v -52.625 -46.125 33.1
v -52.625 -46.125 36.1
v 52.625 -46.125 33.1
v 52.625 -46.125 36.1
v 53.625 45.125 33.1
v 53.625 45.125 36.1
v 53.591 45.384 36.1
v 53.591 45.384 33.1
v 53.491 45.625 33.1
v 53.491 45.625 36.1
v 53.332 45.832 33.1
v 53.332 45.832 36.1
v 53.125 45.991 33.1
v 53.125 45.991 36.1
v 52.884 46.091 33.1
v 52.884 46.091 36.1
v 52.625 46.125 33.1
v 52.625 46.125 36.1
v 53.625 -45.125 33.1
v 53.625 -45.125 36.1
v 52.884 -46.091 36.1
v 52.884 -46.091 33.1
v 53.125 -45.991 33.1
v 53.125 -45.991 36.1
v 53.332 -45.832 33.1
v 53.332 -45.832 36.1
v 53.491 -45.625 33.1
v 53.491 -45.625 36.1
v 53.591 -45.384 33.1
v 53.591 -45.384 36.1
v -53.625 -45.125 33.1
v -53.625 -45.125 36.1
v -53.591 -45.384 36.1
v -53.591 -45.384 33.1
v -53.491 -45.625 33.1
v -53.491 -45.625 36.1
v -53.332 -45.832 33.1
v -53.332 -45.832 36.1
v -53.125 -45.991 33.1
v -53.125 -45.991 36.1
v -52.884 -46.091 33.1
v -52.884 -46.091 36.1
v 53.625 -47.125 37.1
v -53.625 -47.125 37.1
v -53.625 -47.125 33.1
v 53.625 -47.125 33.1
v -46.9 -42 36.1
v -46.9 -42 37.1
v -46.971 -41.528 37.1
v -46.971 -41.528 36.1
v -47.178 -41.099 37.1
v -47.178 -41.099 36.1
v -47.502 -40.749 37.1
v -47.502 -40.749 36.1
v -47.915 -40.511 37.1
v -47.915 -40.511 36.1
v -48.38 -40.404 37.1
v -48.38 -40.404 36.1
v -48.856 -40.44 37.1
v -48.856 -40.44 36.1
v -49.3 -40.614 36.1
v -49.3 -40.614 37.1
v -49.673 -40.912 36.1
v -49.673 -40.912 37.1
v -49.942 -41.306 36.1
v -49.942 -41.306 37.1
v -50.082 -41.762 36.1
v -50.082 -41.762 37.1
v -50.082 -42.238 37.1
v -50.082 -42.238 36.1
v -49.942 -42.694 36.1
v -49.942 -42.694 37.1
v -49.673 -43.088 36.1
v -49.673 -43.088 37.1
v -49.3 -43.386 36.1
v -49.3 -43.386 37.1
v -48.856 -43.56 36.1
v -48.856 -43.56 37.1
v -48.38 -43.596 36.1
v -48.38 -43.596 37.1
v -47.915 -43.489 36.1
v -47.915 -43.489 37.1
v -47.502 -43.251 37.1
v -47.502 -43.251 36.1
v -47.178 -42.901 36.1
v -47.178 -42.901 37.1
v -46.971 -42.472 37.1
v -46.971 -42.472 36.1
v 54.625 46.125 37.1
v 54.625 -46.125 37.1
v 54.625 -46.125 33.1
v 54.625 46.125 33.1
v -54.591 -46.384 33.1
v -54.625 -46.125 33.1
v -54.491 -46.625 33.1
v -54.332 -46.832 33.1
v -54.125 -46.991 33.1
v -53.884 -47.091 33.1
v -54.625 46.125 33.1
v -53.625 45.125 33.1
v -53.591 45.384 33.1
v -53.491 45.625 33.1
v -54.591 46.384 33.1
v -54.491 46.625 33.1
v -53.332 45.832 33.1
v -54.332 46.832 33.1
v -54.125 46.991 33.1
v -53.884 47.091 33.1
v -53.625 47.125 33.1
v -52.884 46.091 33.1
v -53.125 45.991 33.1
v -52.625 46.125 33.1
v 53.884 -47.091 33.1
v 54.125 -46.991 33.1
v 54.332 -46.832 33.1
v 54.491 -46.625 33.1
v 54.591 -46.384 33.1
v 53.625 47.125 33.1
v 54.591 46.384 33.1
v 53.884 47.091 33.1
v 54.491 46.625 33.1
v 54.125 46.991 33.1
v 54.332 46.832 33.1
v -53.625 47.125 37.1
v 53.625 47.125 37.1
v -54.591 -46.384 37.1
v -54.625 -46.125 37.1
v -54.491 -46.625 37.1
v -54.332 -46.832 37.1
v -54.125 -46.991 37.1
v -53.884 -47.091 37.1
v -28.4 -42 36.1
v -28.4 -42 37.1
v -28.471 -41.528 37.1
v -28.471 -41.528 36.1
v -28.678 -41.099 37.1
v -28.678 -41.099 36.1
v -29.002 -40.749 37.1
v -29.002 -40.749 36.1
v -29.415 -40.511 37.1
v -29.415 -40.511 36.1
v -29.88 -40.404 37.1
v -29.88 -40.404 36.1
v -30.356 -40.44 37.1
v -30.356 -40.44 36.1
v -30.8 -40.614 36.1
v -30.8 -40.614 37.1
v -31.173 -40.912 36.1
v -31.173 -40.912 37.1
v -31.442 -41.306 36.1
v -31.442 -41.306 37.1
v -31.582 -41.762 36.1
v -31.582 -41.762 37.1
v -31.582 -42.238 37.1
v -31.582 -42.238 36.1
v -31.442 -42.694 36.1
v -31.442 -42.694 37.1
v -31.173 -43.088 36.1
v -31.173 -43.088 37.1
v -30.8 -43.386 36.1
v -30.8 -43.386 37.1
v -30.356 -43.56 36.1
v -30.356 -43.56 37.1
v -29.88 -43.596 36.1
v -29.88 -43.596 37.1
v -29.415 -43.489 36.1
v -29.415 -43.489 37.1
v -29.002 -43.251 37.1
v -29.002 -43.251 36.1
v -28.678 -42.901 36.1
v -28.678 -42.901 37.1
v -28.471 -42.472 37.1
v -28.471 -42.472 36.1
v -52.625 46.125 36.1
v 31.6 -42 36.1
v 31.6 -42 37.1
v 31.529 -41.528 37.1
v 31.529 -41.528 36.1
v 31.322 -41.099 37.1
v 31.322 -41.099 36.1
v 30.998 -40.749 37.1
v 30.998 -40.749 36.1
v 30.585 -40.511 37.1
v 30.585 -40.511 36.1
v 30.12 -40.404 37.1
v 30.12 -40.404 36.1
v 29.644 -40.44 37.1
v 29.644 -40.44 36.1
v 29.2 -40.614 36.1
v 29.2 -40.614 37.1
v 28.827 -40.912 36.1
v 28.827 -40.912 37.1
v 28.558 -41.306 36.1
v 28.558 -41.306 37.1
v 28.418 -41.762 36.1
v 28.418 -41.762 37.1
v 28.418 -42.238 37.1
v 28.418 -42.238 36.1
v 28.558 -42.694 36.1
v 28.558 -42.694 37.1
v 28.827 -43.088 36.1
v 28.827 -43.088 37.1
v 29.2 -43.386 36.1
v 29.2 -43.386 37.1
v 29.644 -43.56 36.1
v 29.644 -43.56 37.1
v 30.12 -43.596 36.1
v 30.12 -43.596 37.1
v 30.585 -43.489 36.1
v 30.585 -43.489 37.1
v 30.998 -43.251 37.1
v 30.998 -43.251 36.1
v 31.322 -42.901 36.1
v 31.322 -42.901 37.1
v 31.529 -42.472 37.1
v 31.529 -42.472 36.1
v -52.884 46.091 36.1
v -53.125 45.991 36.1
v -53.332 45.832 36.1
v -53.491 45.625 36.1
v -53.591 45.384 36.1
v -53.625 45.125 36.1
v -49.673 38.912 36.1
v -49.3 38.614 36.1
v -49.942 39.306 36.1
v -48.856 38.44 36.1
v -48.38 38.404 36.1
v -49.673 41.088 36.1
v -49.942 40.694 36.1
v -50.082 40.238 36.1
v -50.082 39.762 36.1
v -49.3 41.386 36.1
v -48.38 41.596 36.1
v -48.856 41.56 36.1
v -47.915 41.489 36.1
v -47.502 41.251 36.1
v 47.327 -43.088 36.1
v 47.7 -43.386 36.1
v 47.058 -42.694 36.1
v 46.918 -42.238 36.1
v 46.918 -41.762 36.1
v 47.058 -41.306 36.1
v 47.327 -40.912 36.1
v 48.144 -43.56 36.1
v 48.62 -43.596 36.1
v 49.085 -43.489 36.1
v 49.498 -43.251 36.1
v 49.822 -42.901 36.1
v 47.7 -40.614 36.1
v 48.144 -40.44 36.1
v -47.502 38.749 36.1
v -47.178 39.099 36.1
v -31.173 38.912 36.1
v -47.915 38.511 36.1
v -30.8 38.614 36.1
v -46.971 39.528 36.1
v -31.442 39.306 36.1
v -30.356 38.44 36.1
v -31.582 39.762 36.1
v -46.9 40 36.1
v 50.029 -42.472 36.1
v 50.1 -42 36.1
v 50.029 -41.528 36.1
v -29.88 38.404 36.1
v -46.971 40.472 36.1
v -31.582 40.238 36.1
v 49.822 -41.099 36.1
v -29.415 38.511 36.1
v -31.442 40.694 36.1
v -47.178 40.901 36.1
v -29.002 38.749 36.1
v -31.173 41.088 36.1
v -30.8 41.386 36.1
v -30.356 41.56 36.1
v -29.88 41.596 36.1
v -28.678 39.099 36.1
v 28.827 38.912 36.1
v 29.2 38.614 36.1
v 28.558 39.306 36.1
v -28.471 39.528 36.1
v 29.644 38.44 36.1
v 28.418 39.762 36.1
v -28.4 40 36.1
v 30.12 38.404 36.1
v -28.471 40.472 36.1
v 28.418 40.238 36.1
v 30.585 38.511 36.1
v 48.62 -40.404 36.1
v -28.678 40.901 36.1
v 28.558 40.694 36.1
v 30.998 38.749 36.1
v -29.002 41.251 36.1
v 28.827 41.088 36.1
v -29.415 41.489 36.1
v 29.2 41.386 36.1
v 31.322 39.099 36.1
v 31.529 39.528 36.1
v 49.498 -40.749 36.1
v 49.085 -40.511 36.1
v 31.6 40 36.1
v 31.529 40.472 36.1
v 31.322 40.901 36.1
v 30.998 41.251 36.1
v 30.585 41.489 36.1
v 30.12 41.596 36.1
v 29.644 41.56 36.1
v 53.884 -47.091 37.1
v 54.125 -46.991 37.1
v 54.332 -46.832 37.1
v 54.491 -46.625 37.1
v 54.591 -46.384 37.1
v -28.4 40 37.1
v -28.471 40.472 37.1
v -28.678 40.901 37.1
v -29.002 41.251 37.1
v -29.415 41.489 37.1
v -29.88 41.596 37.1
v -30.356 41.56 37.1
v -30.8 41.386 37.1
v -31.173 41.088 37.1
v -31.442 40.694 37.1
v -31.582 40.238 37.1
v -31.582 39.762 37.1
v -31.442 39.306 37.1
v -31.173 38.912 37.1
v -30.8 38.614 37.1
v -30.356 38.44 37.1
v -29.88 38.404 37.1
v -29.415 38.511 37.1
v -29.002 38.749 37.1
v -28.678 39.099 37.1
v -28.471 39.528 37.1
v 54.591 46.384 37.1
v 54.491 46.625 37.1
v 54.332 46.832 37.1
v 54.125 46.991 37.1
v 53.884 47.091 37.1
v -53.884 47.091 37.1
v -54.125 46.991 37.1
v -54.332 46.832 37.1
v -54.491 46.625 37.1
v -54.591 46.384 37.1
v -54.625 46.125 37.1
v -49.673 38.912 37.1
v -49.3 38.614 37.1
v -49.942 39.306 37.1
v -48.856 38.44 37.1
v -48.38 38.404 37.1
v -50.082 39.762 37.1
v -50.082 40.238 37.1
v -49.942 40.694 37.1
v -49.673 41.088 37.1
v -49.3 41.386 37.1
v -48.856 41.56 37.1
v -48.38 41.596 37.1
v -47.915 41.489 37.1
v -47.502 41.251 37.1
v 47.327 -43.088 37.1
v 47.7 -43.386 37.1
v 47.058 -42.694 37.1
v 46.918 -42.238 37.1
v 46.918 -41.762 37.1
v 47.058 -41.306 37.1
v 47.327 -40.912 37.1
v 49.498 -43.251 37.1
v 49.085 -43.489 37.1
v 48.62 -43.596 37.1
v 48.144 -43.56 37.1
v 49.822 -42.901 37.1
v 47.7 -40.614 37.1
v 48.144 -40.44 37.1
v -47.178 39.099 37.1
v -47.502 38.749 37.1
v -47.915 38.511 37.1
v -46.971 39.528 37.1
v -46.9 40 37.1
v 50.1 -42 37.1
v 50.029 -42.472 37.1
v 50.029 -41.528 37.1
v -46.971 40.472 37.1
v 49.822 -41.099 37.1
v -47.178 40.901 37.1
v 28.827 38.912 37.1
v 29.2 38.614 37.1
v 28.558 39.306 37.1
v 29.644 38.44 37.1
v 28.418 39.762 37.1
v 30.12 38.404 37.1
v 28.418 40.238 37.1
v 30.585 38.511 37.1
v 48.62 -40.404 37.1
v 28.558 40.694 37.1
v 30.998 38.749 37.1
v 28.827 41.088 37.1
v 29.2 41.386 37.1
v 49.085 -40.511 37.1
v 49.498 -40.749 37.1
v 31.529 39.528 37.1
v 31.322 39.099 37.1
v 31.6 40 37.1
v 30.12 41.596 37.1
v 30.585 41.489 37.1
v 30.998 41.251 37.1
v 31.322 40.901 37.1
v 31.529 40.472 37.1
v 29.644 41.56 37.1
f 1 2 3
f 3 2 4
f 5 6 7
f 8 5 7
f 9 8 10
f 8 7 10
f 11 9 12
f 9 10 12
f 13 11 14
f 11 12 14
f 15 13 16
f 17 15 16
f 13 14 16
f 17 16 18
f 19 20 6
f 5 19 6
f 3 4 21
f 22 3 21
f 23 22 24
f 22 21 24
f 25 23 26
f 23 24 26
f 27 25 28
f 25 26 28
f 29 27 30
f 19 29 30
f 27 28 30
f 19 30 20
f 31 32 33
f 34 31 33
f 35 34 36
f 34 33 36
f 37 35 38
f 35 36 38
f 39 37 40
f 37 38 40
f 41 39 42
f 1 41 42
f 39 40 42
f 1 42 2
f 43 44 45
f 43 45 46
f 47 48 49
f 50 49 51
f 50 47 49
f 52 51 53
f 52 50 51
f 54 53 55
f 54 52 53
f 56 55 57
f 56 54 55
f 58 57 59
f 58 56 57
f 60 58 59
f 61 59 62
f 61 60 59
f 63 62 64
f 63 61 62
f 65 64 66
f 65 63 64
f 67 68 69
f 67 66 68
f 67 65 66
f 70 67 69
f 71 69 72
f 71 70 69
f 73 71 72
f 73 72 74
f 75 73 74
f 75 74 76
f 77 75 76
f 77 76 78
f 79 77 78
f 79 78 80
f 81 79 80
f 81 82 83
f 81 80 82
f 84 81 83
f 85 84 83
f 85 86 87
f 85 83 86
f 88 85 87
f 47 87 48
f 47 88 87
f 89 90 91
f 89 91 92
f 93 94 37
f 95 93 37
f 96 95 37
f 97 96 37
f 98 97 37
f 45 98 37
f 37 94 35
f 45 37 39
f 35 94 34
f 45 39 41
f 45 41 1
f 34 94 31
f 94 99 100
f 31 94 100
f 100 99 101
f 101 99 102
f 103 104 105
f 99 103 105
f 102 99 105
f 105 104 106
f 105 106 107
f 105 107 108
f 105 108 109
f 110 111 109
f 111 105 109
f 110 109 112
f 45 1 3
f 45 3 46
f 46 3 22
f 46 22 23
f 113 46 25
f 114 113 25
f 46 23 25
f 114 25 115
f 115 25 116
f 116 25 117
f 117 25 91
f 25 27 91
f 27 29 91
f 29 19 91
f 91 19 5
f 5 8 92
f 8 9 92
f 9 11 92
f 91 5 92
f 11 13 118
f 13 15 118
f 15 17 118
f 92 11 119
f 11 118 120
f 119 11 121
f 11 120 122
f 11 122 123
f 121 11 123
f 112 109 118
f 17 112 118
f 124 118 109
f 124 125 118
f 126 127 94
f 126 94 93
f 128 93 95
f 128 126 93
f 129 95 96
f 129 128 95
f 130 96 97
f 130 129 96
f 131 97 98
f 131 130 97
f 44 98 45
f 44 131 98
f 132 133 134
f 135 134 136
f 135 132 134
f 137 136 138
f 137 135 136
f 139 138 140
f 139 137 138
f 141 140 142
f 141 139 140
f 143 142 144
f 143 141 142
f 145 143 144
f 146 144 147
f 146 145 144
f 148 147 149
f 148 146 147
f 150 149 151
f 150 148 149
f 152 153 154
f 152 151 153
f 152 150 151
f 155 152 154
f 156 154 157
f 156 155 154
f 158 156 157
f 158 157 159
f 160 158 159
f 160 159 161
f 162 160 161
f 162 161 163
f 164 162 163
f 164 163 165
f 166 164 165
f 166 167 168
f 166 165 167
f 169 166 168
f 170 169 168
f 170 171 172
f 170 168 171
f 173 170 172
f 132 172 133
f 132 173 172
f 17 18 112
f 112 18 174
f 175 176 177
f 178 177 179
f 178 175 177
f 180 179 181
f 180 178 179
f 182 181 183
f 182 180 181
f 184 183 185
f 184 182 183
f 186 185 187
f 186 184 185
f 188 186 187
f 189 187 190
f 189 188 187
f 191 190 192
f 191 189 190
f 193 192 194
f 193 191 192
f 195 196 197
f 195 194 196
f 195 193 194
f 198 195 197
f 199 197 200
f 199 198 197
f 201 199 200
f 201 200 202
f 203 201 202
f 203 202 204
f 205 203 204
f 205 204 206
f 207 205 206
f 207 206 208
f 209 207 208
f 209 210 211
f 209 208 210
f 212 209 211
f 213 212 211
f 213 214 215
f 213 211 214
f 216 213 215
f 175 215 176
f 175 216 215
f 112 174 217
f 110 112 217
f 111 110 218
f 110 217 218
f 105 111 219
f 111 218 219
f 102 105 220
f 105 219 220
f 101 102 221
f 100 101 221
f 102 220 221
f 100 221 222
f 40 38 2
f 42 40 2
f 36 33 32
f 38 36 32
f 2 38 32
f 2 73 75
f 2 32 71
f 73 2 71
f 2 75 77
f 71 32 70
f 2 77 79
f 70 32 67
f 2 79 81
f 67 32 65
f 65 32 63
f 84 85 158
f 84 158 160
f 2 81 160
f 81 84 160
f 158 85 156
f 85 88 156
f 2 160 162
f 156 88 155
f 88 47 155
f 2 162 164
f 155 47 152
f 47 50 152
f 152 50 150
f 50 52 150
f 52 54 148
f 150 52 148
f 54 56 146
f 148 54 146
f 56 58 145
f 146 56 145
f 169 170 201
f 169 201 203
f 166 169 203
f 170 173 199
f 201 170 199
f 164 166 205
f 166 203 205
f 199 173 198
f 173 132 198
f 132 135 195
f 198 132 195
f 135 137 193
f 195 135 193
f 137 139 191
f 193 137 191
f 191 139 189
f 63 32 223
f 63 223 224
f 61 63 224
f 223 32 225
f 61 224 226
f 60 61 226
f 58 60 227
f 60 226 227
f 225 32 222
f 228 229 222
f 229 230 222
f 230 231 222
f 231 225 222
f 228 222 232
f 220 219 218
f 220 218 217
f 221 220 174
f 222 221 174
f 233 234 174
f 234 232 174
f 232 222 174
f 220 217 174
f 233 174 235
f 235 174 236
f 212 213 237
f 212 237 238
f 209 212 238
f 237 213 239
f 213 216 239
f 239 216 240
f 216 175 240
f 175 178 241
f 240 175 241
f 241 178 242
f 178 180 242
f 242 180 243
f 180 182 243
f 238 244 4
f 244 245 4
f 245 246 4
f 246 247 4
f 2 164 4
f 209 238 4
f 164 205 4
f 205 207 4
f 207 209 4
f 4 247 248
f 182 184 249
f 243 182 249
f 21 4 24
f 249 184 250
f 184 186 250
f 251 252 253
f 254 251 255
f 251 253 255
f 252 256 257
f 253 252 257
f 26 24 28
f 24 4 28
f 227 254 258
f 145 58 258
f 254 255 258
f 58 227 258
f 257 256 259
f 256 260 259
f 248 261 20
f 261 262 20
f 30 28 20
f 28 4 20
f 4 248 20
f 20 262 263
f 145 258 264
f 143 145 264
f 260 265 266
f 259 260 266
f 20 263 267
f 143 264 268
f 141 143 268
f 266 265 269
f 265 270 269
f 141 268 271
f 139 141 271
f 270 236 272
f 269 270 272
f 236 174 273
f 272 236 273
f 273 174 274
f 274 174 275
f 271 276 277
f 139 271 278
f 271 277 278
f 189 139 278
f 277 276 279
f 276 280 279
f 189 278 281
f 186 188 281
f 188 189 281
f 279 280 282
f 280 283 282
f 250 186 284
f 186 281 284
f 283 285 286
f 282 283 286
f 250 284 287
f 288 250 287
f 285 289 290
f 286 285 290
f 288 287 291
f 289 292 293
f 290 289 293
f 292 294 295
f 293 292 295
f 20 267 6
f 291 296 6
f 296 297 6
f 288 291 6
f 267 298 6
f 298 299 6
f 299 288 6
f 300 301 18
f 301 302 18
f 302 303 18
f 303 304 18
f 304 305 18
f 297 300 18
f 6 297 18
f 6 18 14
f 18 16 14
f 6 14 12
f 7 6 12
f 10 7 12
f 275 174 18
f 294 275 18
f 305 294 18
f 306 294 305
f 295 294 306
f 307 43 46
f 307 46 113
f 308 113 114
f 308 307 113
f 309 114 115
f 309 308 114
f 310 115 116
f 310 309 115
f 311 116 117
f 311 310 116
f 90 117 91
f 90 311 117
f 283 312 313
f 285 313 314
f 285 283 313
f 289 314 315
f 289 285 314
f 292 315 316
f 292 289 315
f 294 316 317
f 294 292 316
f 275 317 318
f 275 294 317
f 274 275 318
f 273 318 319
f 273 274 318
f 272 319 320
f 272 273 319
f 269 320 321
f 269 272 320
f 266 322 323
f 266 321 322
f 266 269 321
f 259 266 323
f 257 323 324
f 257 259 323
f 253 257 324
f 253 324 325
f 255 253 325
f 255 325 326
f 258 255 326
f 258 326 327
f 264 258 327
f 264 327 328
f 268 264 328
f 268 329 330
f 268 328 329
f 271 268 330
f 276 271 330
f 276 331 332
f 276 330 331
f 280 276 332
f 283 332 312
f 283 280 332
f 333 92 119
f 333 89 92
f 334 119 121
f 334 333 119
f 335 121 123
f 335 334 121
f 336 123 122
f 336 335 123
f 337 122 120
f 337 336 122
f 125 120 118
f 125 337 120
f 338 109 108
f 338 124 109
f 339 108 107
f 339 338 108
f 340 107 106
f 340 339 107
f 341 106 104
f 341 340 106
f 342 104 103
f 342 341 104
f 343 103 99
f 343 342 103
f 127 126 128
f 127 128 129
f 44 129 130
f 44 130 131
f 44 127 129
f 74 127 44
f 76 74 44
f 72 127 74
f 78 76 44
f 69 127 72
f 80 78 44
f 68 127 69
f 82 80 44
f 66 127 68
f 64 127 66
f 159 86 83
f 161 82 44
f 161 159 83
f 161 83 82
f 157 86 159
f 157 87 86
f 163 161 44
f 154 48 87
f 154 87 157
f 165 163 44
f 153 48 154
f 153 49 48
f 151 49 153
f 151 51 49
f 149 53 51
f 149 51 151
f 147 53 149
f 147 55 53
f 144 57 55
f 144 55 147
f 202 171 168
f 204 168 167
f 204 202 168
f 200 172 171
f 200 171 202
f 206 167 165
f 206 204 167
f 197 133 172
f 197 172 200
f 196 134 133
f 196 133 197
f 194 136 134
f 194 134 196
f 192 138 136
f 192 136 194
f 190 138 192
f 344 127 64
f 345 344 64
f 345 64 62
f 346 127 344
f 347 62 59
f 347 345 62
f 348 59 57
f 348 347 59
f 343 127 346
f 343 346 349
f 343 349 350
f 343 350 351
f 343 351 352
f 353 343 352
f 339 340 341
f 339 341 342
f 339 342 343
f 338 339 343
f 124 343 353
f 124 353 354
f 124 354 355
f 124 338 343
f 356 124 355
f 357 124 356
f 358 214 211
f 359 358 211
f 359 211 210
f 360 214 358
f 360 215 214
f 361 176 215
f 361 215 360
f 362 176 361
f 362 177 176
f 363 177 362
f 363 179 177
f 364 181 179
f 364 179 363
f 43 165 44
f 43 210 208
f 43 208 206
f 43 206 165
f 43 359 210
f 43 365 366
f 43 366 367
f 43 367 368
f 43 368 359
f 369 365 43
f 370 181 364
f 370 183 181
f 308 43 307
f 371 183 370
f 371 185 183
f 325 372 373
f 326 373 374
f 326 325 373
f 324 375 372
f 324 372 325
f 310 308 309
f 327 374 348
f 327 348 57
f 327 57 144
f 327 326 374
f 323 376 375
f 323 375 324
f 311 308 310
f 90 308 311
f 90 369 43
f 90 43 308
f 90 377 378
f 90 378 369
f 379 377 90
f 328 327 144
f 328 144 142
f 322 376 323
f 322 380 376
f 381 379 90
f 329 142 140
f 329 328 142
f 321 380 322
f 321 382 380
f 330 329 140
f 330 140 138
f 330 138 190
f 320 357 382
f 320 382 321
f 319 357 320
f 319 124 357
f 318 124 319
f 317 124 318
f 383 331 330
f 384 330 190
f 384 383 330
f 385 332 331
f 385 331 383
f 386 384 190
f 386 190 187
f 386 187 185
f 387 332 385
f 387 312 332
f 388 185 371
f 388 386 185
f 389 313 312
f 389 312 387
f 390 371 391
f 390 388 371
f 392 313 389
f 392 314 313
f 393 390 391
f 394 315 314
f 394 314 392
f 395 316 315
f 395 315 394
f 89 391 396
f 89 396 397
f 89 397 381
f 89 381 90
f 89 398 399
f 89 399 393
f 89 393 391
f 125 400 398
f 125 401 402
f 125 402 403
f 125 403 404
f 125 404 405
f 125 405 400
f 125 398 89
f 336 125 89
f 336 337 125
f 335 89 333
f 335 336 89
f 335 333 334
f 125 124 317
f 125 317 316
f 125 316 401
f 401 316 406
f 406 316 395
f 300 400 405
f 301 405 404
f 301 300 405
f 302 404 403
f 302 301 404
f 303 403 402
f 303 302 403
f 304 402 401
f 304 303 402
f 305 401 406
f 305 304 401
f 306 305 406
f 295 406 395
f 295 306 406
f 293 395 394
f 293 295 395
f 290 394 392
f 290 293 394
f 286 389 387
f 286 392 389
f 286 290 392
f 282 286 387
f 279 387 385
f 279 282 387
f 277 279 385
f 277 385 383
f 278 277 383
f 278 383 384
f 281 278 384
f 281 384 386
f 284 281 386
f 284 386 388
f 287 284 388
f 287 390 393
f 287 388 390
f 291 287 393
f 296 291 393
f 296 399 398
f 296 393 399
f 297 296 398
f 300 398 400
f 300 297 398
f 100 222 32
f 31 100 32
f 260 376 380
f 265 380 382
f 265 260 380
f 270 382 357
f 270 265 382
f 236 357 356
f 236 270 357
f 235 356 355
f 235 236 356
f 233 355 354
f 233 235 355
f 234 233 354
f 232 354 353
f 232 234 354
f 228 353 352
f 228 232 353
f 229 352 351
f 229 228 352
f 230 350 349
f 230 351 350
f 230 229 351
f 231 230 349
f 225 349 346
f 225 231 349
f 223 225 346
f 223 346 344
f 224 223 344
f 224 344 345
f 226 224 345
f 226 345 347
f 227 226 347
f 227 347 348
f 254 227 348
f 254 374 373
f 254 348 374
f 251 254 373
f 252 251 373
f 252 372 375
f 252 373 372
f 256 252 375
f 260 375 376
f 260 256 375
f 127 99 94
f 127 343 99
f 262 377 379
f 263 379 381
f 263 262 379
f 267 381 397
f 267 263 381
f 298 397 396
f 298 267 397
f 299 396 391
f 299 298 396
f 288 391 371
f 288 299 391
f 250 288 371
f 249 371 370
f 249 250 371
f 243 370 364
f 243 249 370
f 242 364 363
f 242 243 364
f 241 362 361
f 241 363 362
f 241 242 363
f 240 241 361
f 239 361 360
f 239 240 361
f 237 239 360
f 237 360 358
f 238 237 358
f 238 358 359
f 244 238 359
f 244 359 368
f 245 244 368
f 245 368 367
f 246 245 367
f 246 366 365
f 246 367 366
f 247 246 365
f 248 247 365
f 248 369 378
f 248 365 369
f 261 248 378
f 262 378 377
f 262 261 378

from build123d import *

# Parameters (mm, degrees)
PAD015_DEPTH    = 1
PAD016_DEPTH    = 3
SKETCH029_R     = 1.6
POCKET012_DEPTH = 5


with BuildPart() as part:
    # Sketch027 → Pad015 (new body)
    with BuildSketch(Plane.XY):
        with BuildLine():
            Line((-54.625, 46.125), (-54.625, -46.125))
            ThreePointArc((-54.625, -46.125), (-54.332107, -46.832107), (-53.625, -47.125))
            Line((-53.625, -47.125), (53.625, -47.125))
            ThreePointArc((53.625, -47.125), (54.332107, -46.832107), (54.625, -46.125))
            Line((54.625, -46.125), (54.625, 46.125))
            ThreePointArc((54.625, 46.125), (54.332107, 46.832107), (53.625, 47.125))
            Line((53.625, 47.125), (-53.625, 47.125))
            ThreePointArc((-53.625, 47.125), (-54.332107, 46.832107), (-54.625, 46.125))
        make_face()
    extrude(amount=PAD015_DEPTH)

    # Sketch028 → Pad016 (join)
    with BuildSketch(Plane.XY):
        with BuildLine():
            Line((-54.625, 46.125), (-54.625, -46.125))
            ThreePointArc((-54.625, -46.125), (-54.332107, -46.832107), (-53.625, -47.125))
            Line((-53.625, -47.125), (53.625, -47.125))
            ThreePointArc((53.625, -47.125), (54.332107, -46.832107), (54.625, -46.125))
            Line((54.625, -46.125), (54.625, 46.125))
            ThreePointArc((54.625, 46.125), (54.332107, 46.832107), (53.625, 47.125))
            Line((53.625, 47.125), (-53.625, 47.125))
            ThreePointArc((-53.625, 47.125), (-54.332107, 46.832107), (-54.625, 46.125))
        make_face()
        with BuildLine():
            Line((-53.625, 45.125), (-53.625, -45.125))
            ThreePointArc((-53.625, -45.125), (-53.332107, -45.832107), (-52.625, -46.125))
            Line((-52.625, -46.125), (52.625, -46.125))
            ThreePointArc((52.625, -46.125), (53.332107, -45.832107), (53.625, -45.125))
            Line((53.625, -45.125), (53.625, 45.125))
            ThreePointArc((53.625, 45.125), (53.332107, 45.832107), (52.625, 46.125))
            Line((52.625, 46.125), (-52.625, 46.125))
            ThreePointArc((-52.625, 46.125), (-53.332107, 45.832107), (-53.625, 45.125))
        make_face(mode=Mode.SUBTRACT)
    extrude(amount=-PAD016_DEPTH)

    # Sketch029 → Pocket012 (cut)
    with BuildSketch(Plane.XY):
        with Locations((-48.5, 40)):
            Circle(SKETCH029_R)
        with Locations((-30, 40)):
            Circle(SKETCH029_R)
        with Locations((30, 40)):
            Circle(SKETCH029_R)
        with Locations((-30, -42)):
            Circle(SKETCH029_R)
        with Locations((-48.5, -42)):
            Circle(SKETCH029_R)
        with Locations((30, -42)):
            Circle(SKETCH029_R)
        with Locations((48.5, -42)):
            Circle(SKETCH029_R)
    extrude(amount=POCKET012_DEPTH, mode=Mode.SUBTRACT)


with BuildPart() as part_1:
    # Body007 placement: moved
    add(part.part.moved(Location((0, 0, 36.1))))


solid = part_1.part
